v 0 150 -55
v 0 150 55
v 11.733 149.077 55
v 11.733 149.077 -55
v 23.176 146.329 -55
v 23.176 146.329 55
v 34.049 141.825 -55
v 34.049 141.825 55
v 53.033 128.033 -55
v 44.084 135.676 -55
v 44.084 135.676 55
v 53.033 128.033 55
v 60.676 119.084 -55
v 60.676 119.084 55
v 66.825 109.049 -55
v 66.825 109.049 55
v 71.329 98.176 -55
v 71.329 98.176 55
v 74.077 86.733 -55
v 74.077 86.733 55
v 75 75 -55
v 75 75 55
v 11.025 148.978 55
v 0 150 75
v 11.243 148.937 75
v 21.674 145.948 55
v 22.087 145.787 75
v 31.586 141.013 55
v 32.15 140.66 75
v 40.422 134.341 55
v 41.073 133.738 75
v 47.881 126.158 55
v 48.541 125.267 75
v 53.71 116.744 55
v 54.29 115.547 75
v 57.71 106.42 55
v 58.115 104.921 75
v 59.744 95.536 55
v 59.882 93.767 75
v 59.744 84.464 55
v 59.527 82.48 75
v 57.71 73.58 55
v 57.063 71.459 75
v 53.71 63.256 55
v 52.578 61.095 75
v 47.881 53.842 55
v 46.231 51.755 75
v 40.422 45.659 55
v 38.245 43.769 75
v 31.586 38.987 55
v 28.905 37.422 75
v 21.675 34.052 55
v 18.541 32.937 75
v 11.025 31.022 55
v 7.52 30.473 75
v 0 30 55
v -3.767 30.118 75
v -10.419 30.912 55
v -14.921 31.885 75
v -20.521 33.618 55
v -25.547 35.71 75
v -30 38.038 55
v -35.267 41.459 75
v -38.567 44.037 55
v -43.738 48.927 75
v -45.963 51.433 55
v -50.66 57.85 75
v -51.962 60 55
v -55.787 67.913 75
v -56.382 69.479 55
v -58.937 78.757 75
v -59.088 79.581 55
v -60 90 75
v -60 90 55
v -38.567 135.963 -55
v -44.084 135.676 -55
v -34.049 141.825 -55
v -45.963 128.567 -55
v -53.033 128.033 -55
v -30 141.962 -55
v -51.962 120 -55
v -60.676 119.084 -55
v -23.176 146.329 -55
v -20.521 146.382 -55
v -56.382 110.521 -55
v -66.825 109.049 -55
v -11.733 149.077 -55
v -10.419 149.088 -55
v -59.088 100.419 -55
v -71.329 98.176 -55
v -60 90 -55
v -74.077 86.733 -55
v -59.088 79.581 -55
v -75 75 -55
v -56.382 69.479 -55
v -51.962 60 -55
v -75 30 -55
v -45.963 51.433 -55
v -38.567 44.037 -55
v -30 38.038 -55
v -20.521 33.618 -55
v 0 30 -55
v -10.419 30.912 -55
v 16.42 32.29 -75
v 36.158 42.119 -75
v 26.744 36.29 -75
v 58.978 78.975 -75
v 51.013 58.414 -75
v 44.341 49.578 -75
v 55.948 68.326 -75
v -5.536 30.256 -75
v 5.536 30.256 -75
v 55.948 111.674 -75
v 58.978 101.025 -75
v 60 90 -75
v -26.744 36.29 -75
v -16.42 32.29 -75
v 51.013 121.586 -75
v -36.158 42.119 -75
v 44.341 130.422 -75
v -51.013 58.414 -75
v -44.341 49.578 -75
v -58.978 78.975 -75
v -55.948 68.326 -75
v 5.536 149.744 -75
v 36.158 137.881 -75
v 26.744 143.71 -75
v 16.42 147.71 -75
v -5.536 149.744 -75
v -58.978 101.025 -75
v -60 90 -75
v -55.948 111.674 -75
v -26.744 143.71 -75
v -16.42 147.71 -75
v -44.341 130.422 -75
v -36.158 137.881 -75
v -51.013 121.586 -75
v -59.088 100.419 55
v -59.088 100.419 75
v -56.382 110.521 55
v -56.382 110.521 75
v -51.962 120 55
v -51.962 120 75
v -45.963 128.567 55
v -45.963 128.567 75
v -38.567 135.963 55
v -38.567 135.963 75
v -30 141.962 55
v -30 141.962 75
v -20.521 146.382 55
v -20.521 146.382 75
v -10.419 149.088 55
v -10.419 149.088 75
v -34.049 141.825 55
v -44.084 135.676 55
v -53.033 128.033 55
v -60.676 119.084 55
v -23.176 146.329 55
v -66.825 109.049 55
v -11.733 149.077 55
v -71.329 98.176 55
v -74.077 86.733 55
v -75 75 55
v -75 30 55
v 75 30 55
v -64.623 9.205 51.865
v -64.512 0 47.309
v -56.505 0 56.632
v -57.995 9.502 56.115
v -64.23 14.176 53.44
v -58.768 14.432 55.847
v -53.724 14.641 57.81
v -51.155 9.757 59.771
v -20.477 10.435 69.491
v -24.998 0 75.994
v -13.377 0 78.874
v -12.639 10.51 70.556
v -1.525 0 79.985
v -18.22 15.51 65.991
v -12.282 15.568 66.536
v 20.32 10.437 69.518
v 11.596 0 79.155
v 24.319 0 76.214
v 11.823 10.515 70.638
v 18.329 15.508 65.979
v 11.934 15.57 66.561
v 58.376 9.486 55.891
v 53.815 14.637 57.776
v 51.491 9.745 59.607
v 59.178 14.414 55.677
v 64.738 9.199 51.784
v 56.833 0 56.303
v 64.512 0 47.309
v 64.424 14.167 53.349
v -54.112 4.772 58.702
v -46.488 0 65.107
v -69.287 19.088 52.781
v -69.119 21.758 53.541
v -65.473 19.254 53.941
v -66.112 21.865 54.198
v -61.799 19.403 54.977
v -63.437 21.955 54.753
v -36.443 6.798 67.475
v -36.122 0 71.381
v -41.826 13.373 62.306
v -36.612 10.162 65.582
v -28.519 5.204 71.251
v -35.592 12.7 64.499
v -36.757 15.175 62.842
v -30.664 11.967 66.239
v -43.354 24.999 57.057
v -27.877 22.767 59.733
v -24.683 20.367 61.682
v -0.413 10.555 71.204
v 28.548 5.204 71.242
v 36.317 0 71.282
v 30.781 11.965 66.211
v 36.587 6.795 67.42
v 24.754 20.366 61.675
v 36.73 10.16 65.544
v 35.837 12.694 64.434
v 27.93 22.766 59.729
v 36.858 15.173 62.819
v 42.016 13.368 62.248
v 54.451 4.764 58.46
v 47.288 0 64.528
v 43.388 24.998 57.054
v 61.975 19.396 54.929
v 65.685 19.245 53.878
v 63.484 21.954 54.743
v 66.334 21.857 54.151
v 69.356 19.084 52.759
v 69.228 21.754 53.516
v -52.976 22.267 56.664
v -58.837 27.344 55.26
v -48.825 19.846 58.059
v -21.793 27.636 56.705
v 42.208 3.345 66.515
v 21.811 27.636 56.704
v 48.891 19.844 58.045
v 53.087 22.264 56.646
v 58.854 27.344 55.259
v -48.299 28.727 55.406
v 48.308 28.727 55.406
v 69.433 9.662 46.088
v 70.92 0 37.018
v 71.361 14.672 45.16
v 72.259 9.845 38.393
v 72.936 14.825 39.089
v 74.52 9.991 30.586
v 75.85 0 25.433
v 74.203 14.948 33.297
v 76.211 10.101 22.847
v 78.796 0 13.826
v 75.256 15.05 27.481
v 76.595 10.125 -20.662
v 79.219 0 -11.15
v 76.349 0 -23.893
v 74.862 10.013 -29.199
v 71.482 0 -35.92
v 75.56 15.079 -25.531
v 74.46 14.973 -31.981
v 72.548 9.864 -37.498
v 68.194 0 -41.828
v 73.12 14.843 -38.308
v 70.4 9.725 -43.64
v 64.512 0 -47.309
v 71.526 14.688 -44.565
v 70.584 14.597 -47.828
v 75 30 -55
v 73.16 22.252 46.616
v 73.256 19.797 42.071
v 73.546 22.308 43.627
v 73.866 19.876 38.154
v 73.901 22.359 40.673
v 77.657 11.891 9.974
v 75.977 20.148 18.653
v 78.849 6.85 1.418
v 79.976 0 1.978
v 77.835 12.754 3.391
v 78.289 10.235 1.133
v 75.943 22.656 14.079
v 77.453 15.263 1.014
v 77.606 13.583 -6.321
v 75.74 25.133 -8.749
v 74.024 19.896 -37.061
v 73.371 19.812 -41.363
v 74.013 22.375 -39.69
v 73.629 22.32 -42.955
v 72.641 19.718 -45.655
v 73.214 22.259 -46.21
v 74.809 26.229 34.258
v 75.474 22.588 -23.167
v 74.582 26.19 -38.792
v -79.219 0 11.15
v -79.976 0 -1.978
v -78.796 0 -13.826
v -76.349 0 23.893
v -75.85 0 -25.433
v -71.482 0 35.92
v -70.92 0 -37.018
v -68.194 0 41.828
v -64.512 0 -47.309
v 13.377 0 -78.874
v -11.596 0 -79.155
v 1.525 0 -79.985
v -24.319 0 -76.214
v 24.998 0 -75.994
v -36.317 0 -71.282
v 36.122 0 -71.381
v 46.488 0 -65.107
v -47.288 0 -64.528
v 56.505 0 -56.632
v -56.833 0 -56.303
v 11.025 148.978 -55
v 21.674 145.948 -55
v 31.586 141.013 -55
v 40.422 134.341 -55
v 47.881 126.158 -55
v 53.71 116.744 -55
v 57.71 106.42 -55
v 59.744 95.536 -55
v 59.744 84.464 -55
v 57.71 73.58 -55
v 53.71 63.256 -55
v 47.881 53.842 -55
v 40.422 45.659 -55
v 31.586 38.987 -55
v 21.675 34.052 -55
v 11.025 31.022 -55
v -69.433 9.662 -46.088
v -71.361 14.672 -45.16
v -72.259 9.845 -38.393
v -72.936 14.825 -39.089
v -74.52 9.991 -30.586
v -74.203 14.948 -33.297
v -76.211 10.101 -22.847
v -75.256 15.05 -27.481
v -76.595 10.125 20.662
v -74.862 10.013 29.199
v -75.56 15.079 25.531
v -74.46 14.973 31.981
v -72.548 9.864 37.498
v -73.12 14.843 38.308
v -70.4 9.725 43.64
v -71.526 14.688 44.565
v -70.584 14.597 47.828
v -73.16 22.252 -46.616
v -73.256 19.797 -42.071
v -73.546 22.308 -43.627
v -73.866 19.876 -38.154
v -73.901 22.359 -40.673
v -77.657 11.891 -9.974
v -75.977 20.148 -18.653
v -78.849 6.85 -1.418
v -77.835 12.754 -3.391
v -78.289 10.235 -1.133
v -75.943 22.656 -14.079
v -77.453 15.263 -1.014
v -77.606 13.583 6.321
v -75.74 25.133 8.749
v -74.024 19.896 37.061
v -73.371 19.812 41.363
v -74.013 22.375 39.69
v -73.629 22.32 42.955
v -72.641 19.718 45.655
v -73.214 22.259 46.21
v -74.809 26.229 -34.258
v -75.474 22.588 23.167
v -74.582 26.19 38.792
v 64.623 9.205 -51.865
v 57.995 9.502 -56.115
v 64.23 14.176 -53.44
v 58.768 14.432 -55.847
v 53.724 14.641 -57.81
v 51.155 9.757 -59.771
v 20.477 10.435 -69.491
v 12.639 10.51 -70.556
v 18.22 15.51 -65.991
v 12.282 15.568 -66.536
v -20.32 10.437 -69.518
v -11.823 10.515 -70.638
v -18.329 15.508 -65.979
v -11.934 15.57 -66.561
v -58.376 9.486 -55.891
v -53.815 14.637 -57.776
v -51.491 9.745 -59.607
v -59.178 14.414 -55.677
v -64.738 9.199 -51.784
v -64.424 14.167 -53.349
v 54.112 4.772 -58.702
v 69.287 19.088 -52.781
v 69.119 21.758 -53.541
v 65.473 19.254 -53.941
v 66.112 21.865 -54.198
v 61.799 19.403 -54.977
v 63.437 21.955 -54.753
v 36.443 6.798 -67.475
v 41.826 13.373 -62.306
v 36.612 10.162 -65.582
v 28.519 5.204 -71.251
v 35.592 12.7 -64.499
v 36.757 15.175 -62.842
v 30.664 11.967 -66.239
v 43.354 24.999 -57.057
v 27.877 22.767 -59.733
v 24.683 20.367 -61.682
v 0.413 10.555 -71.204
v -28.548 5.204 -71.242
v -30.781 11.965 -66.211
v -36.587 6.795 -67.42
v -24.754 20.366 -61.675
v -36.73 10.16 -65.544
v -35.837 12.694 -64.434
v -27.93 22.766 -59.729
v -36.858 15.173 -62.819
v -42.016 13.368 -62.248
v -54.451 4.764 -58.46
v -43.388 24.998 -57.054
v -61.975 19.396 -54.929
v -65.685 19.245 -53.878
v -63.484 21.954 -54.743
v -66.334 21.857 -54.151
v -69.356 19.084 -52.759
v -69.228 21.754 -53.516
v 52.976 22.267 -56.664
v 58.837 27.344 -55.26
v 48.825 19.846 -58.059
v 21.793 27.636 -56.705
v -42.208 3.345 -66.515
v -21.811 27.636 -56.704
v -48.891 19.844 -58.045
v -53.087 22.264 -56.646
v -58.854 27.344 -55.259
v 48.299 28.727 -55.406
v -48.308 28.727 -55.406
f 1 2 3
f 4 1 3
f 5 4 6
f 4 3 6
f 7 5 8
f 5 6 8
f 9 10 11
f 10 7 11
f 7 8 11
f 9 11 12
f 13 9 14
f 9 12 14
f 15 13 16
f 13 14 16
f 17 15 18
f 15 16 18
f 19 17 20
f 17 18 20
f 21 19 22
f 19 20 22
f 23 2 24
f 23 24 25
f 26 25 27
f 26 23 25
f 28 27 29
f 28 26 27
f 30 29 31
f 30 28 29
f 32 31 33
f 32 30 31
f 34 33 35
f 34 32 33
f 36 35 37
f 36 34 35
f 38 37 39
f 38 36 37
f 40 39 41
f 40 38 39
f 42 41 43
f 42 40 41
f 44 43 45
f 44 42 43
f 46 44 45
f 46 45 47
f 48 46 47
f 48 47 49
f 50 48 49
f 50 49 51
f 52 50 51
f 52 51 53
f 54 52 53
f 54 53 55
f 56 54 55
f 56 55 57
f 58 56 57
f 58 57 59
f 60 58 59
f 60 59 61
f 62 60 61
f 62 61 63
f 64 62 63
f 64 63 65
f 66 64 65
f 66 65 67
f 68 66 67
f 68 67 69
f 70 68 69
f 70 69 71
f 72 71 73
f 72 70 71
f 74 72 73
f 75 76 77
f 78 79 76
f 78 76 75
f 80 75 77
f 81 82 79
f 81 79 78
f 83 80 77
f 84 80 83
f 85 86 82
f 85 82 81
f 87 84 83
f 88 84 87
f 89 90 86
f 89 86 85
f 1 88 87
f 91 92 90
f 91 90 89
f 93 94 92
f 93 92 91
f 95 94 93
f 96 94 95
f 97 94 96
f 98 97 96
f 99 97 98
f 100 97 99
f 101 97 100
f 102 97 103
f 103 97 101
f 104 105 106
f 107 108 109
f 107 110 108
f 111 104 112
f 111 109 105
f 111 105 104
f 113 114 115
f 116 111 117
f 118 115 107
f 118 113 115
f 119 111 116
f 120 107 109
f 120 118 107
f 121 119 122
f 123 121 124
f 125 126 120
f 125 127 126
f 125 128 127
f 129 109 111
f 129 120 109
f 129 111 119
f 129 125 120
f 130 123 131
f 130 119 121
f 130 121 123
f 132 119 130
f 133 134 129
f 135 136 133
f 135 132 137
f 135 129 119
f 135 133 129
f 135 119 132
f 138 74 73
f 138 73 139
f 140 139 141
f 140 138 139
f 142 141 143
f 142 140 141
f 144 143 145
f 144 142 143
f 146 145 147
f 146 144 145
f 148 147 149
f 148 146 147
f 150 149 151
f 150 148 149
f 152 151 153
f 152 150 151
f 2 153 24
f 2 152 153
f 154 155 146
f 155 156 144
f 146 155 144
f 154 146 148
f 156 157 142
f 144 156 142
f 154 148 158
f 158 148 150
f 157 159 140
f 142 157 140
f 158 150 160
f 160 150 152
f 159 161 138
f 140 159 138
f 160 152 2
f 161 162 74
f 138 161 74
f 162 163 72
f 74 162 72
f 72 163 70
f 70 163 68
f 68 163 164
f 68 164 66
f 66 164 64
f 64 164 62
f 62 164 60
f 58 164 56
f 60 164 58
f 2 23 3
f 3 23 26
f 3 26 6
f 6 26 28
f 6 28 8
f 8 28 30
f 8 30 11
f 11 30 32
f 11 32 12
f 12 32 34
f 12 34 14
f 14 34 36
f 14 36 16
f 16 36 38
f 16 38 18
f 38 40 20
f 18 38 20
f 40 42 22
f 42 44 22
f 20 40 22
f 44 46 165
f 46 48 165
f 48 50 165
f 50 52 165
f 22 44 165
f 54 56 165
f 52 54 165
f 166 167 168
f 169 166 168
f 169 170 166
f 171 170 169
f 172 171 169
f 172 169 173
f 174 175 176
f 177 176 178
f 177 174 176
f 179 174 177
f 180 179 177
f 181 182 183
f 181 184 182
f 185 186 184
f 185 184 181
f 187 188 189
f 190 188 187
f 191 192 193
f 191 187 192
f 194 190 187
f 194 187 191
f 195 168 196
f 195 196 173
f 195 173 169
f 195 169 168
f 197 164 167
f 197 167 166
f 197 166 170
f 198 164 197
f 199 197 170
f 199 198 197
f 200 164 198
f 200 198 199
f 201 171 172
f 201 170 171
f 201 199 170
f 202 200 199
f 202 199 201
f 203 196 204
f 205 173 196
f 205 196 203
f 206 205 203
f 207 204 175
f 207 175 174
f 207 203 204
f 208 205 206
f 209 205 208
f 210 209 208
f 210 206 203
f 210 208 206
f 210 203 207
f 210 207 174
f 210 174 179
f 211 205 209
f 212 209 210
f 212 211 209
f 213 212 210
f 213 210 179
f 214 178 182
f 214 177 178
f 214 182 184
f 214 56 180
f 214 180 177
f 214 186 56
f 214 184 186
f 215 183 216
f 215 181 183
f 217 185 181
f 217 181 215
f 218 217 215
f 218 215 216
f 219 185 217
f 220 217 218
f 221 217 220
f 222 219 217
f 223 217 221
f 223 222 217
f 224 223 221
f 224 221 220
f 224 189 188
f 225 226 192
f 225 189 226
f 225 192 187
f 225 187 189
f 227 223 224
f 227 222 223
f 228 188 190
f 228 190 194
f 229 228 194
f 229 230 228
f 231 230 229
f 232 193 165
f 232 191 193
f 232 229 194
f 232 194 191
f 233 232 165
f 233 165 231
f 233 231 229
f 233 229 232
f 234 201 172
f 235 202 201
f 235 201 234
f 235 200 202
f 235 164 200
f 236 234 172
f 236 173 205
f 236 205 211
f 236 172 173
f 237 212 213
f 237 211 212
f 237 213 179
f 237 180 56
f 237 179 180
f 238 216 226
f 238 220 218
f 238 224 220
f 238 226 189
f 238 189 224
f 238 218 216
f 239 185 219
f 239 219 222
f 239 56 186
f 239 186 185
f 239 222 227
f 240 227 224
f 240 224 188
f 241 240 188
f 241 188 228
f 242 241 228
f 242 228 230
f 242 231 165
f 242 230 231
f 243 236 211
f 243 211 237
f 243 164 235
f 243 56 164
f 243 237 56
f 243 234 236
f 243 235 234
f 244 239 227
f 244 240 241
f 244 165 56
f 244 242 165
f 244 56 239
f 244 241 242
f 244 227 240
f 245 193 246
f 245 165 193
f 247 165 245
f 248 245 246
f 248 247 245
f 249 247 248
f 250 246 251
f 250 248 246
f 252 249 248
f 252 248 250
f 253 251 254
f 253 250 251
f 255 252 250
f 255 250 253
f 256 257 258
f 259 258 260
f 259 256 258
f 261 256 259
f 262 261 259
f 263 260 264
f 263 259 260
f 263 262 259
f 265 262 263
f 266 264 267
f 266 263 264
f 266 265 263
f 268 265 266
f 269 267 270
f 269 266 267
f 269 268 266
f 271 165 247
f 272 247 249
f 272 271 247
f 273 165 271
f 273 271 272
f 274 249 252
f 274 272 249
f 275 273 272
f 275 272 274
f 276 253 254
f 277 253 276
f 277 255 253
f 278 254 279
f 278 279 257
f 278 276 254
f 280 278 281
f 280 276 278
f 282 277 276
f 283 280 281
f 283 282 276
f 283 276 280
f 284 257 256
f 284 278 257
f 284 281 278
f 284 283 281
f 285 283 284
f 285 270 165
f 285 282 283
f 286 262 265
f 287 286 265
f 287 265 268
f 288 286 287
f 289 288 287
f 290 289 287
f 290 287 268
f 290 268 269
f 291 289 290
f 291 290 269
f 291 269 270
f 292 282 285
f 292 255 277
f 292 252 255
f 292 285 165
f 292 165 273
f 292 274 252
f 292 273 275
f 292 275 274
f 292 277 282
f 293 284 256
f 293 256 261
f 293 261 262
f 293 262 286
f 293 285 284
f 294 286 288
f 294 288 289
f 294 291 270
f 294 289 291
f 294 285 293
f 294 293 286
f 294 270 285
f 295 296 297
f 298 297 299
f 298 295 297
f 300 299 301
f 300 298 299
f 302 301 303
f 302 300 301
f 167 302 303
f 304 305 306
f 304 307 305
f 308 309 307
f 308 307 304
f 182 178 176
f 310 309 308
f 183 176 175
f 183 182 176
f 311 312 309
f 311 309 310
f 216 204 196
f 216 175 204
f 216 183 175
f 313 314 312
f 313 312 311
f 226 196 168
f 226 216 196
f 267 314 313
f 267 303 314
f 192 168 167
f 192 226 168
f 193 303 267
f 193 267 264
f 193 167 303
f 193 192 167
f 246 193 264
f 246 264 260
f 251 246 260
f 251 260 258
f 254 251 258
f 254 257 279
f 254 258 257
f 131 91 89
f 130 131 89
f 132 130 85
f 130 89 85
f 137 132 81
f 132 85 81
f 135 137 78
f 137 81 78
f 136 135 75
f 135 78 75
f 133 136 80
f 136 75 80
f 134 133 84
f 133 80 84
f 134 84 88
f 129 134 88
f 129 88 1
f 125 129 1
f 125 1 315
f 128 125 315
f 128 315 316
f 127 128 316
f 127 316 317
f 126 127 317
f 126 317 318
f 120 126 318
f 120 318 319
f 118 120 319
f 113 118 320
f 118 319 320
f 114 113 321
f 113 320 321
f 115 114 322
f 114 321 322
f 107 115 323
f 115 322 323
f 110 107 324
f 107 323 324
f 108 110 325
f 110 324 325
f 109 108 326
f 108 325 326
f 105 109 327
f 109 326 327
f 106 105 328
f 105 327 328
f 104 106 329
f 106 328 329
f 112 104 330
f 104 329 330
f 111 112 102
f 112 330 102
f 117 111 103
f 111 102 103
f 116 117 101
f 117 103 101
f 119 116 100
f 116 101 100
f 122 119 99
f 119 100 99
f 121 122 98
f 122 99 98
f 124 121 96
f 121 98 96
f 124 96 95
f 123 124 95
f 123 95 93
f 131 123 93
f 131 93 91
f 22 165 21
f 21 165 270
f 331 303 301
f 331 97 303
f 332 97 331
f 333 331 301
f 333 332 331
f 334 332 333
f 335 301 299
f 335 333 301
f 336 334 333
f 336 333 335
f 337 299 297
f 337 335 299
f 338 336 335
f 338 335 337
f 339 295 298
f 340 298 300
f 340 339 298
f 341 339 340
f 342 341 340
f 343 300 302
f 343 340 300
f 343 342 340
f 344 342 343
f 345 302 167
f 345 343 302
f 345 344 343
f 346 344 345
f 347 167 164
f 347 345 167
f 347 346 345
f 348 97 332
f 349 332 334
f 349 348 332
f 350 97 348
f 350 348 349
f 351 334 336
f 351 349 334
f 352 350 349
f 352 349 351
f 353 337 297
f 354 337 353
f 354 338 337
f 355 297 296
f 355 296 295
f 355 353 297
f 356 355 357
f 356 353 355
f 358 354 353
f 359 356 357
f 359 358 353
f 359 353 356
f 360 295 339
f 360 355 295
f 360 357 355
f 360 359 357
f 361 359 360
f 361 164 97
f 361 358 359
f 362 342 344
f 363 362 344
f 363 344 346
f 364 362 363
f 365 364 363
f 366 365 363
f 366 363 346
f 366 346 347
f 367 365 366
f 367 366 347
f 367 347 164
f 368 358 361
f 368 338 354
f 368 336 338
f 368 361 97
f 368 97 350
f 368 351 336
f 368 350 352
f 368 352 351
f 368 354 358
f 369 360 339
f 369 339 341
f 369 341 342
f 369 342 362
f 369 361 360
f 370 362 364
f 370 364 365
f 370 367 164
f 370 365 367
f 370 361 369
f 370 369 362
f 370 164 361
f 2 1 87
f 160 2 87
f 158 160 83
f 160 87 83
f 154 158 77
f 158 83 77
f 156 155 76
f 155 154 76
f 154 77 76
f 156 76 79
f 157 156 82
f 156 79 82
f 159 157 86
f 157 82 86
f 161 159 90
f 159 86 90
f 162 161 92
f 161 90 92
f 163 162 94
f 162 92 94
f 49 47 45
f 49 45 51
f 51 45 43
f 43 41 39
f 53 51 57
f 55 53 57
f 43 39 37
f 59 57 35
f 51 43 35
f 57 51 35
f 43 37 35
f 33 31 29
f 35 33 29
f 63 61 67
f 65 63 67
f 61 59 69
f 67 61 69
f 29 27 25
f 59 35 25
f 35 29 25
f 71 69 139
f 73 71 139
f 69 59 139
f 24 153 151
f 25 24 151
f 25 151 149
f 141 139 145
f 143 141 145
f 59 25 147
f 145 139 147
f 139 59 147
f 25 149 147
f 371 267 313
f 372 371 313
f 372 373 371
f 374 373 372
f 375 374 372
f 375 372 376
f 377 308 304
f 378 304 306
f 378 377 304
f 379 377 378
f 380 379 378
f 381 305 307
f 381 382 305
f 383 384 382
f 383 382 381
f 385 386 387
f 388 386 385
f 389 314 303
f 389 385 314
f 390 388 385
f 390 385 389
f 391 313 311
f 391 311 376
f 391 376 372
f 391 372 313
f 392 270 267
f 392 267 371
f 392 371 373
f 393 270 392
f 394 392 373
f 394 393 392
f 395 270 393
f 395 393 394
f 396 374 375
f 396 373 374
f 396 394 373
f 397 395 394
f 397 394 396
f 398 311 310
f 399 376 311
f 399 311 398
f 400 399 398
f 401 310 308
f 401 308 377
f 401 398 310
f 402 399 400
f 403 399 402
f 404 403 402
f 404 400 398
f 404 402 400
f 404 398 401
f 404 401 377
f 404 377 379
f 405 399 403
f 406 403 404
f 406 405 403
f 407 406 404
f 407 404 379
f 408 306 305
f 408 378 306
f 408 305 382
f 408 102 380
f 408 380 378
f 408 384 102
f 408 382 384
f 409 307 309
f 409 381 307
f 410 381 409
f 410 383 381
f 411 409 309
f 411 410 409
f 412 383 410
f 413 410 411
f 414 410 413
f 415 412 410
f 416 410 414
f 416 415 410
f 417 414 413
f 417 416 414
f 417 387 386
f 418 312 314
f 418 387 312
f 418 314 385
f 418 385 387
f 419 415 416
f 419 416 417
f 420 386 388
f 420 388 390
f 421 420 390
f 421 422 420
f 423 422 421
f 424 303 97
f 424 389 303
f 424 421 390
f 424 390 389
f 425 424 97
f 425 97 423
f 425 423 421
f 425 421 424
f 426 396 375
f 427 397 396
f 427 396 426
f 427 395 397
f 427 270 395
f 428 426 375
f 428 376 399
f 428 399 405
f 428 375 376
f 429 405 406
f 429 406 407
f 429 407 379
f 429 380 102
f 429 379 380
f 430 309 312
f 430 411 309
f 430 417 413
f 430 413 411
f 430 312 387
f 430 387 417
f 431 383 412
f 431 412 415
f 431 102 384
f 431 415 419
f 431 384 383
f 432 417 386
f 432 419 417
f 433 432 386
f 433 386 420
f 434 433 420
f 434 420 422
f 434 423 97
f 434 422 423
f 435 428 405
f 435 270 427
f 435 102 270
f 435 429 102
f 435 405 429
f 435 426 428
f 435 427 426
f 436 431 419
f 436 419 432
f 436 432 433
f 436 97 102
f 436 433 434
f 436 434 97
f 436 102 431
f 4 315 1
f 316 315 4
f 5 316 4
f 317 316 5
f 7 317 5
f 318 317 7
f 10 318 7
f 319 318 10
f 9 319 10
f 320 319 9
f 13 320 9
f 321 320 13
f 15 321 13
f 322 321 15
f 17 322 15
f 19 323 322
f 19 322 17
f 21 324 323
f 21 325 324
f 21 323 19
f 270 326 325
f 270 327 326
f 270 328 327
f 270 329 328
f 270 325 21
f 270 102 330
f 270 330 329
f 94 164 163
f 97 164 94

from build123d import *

# Parameters (mm, degrees)
SKIZZE4_W                       = 150
SKIZZE4_H                       = 110
AUFSATZ_LINEAR_AUSTRAGEN1_DEPTH = 120
SKIZZE5_R                       = 60
AUFSATZ_LINEAR_AUSTRAGEN2_DEPTH = 20
VERRUNDUNG1_R                   = 75


with BuildPart() as part:
    # Skizze1 for Ausformung1 → Ausformung1 section 0
    with BuildSketch(Plane(origin=(0, 0, 0), x_dir=(1, 0, 0), z_dir=(0, 1, 0))):
        with BuildLine():
            # circular arc as an exact rational Bezier (weights 1, cos(half-angle), 1)
            Bezier((-64.512399668, -47.30909309), (0, -135.280547185), (64.512399668, -47.30909309), weights=[1, 0.591363664, 1])
            Bezier((64.512399668, -47.30909309), (99.205734602, 0), (64.512399668, 47.30909309), weights=[1, 0.806404996, 1])
            Bezier((64.512399668, 47.30909309), (0, 135.280547185), (-64.512399668, 47.30909309), weights=[1, 0.591363664, 1])
            Bezier((-64.512399668, 47.30909309), (-99.205734602, 0), (-64.512399668, -47.30909309), weights=[1, 0.806404996, 1])
        make_face()
    # Skizze2 → Ausformung1 section 1
    with BuildSketch(Plane(origin=(0, 30, 0), x_dir=(1, 0, 0), z_dir=(0, 1, 0))):
        with BuildLine():
            Line((-75, -55), (75, -55))
            Line((75, -55), (75, 55))
            Line((75, 55), (-75, 55))
            Line((-75, 55), (-75, -55))
        make_face()
    loft()

    # Skizze4 → Aufsatz-Linear austragen1 (add)
    with BuildSketch(Plane(origin=(0, 30, 0), x_dir=(1, 0, 0), z_dir=(0, 1, 0))):
        Rectangle(SKIZZE4_W, SKIZZE4_H)
    extrude(amount=AUFSATZ_LINEAR_AUSTRAGEN1_DEPTH)

    # Skizze5 → Aufsatz-Linear austragen2 (add)
    with BuildSketch(Plane(origin=(-20, 0, 55), x_dir=(-1, 0, 0), z_dir=(0, 0, -1))):
        with Locations((-20, 90)):
            Circle(SKIZZE5_R)
    aufsatz_linear_austragen2 = extrude(amount=-AUFSATZ_LINEAR_AUSTRAGEN2_DEPTH)

    # Spiegeln1: Aufsatz-Linear austragen2 across plane
    add(aufsatz_linear_austragen2.mirror(Plane.XY))

    # Verrundung1
    # the kernel refuses this fillet: 75 mm, written as the material it takes off along each edge
    with BuildSketch(Plane(origin=(75, 150, 242.5), x_dir=(0, -1, 0), z_dir=(0, 0, -1))) as verrundung1_piece_1:
        with BuildLine():
            CenterArc((VERRUNDUNG1_R, VERRUNDUNG1_R), VERRUNDUNG1_R, 180, 90)
            Line((0, VERRUNDUNG1_R), (0, 0))
            Line((0, 0), (VERRUNDUNG1_R, 0))
        make_face()
    extrude(amount=485, mode=Mode.SUBTRACT)
    with BuildSketch(Plane(origin=(-75, 150, -242.5), x_dir=(1, 0, 0), z_dir=(0, 0, 1))) as verrundung1_piece_2:
        with BuildLine():
            CenterArc((VERRUNDUNG1_R, -VERRUNDUNG1_R), VERRUNDUNG1_R, 90, 90)
            Line((0, -VERRUNDUNG1_R), (0, 0))
            Line((0, 0), (VERRUNDUNG1_R, 0))
        make_face()
    extrude(amount=485, mode=Mode.SUBTRACT)


solid = part.part
